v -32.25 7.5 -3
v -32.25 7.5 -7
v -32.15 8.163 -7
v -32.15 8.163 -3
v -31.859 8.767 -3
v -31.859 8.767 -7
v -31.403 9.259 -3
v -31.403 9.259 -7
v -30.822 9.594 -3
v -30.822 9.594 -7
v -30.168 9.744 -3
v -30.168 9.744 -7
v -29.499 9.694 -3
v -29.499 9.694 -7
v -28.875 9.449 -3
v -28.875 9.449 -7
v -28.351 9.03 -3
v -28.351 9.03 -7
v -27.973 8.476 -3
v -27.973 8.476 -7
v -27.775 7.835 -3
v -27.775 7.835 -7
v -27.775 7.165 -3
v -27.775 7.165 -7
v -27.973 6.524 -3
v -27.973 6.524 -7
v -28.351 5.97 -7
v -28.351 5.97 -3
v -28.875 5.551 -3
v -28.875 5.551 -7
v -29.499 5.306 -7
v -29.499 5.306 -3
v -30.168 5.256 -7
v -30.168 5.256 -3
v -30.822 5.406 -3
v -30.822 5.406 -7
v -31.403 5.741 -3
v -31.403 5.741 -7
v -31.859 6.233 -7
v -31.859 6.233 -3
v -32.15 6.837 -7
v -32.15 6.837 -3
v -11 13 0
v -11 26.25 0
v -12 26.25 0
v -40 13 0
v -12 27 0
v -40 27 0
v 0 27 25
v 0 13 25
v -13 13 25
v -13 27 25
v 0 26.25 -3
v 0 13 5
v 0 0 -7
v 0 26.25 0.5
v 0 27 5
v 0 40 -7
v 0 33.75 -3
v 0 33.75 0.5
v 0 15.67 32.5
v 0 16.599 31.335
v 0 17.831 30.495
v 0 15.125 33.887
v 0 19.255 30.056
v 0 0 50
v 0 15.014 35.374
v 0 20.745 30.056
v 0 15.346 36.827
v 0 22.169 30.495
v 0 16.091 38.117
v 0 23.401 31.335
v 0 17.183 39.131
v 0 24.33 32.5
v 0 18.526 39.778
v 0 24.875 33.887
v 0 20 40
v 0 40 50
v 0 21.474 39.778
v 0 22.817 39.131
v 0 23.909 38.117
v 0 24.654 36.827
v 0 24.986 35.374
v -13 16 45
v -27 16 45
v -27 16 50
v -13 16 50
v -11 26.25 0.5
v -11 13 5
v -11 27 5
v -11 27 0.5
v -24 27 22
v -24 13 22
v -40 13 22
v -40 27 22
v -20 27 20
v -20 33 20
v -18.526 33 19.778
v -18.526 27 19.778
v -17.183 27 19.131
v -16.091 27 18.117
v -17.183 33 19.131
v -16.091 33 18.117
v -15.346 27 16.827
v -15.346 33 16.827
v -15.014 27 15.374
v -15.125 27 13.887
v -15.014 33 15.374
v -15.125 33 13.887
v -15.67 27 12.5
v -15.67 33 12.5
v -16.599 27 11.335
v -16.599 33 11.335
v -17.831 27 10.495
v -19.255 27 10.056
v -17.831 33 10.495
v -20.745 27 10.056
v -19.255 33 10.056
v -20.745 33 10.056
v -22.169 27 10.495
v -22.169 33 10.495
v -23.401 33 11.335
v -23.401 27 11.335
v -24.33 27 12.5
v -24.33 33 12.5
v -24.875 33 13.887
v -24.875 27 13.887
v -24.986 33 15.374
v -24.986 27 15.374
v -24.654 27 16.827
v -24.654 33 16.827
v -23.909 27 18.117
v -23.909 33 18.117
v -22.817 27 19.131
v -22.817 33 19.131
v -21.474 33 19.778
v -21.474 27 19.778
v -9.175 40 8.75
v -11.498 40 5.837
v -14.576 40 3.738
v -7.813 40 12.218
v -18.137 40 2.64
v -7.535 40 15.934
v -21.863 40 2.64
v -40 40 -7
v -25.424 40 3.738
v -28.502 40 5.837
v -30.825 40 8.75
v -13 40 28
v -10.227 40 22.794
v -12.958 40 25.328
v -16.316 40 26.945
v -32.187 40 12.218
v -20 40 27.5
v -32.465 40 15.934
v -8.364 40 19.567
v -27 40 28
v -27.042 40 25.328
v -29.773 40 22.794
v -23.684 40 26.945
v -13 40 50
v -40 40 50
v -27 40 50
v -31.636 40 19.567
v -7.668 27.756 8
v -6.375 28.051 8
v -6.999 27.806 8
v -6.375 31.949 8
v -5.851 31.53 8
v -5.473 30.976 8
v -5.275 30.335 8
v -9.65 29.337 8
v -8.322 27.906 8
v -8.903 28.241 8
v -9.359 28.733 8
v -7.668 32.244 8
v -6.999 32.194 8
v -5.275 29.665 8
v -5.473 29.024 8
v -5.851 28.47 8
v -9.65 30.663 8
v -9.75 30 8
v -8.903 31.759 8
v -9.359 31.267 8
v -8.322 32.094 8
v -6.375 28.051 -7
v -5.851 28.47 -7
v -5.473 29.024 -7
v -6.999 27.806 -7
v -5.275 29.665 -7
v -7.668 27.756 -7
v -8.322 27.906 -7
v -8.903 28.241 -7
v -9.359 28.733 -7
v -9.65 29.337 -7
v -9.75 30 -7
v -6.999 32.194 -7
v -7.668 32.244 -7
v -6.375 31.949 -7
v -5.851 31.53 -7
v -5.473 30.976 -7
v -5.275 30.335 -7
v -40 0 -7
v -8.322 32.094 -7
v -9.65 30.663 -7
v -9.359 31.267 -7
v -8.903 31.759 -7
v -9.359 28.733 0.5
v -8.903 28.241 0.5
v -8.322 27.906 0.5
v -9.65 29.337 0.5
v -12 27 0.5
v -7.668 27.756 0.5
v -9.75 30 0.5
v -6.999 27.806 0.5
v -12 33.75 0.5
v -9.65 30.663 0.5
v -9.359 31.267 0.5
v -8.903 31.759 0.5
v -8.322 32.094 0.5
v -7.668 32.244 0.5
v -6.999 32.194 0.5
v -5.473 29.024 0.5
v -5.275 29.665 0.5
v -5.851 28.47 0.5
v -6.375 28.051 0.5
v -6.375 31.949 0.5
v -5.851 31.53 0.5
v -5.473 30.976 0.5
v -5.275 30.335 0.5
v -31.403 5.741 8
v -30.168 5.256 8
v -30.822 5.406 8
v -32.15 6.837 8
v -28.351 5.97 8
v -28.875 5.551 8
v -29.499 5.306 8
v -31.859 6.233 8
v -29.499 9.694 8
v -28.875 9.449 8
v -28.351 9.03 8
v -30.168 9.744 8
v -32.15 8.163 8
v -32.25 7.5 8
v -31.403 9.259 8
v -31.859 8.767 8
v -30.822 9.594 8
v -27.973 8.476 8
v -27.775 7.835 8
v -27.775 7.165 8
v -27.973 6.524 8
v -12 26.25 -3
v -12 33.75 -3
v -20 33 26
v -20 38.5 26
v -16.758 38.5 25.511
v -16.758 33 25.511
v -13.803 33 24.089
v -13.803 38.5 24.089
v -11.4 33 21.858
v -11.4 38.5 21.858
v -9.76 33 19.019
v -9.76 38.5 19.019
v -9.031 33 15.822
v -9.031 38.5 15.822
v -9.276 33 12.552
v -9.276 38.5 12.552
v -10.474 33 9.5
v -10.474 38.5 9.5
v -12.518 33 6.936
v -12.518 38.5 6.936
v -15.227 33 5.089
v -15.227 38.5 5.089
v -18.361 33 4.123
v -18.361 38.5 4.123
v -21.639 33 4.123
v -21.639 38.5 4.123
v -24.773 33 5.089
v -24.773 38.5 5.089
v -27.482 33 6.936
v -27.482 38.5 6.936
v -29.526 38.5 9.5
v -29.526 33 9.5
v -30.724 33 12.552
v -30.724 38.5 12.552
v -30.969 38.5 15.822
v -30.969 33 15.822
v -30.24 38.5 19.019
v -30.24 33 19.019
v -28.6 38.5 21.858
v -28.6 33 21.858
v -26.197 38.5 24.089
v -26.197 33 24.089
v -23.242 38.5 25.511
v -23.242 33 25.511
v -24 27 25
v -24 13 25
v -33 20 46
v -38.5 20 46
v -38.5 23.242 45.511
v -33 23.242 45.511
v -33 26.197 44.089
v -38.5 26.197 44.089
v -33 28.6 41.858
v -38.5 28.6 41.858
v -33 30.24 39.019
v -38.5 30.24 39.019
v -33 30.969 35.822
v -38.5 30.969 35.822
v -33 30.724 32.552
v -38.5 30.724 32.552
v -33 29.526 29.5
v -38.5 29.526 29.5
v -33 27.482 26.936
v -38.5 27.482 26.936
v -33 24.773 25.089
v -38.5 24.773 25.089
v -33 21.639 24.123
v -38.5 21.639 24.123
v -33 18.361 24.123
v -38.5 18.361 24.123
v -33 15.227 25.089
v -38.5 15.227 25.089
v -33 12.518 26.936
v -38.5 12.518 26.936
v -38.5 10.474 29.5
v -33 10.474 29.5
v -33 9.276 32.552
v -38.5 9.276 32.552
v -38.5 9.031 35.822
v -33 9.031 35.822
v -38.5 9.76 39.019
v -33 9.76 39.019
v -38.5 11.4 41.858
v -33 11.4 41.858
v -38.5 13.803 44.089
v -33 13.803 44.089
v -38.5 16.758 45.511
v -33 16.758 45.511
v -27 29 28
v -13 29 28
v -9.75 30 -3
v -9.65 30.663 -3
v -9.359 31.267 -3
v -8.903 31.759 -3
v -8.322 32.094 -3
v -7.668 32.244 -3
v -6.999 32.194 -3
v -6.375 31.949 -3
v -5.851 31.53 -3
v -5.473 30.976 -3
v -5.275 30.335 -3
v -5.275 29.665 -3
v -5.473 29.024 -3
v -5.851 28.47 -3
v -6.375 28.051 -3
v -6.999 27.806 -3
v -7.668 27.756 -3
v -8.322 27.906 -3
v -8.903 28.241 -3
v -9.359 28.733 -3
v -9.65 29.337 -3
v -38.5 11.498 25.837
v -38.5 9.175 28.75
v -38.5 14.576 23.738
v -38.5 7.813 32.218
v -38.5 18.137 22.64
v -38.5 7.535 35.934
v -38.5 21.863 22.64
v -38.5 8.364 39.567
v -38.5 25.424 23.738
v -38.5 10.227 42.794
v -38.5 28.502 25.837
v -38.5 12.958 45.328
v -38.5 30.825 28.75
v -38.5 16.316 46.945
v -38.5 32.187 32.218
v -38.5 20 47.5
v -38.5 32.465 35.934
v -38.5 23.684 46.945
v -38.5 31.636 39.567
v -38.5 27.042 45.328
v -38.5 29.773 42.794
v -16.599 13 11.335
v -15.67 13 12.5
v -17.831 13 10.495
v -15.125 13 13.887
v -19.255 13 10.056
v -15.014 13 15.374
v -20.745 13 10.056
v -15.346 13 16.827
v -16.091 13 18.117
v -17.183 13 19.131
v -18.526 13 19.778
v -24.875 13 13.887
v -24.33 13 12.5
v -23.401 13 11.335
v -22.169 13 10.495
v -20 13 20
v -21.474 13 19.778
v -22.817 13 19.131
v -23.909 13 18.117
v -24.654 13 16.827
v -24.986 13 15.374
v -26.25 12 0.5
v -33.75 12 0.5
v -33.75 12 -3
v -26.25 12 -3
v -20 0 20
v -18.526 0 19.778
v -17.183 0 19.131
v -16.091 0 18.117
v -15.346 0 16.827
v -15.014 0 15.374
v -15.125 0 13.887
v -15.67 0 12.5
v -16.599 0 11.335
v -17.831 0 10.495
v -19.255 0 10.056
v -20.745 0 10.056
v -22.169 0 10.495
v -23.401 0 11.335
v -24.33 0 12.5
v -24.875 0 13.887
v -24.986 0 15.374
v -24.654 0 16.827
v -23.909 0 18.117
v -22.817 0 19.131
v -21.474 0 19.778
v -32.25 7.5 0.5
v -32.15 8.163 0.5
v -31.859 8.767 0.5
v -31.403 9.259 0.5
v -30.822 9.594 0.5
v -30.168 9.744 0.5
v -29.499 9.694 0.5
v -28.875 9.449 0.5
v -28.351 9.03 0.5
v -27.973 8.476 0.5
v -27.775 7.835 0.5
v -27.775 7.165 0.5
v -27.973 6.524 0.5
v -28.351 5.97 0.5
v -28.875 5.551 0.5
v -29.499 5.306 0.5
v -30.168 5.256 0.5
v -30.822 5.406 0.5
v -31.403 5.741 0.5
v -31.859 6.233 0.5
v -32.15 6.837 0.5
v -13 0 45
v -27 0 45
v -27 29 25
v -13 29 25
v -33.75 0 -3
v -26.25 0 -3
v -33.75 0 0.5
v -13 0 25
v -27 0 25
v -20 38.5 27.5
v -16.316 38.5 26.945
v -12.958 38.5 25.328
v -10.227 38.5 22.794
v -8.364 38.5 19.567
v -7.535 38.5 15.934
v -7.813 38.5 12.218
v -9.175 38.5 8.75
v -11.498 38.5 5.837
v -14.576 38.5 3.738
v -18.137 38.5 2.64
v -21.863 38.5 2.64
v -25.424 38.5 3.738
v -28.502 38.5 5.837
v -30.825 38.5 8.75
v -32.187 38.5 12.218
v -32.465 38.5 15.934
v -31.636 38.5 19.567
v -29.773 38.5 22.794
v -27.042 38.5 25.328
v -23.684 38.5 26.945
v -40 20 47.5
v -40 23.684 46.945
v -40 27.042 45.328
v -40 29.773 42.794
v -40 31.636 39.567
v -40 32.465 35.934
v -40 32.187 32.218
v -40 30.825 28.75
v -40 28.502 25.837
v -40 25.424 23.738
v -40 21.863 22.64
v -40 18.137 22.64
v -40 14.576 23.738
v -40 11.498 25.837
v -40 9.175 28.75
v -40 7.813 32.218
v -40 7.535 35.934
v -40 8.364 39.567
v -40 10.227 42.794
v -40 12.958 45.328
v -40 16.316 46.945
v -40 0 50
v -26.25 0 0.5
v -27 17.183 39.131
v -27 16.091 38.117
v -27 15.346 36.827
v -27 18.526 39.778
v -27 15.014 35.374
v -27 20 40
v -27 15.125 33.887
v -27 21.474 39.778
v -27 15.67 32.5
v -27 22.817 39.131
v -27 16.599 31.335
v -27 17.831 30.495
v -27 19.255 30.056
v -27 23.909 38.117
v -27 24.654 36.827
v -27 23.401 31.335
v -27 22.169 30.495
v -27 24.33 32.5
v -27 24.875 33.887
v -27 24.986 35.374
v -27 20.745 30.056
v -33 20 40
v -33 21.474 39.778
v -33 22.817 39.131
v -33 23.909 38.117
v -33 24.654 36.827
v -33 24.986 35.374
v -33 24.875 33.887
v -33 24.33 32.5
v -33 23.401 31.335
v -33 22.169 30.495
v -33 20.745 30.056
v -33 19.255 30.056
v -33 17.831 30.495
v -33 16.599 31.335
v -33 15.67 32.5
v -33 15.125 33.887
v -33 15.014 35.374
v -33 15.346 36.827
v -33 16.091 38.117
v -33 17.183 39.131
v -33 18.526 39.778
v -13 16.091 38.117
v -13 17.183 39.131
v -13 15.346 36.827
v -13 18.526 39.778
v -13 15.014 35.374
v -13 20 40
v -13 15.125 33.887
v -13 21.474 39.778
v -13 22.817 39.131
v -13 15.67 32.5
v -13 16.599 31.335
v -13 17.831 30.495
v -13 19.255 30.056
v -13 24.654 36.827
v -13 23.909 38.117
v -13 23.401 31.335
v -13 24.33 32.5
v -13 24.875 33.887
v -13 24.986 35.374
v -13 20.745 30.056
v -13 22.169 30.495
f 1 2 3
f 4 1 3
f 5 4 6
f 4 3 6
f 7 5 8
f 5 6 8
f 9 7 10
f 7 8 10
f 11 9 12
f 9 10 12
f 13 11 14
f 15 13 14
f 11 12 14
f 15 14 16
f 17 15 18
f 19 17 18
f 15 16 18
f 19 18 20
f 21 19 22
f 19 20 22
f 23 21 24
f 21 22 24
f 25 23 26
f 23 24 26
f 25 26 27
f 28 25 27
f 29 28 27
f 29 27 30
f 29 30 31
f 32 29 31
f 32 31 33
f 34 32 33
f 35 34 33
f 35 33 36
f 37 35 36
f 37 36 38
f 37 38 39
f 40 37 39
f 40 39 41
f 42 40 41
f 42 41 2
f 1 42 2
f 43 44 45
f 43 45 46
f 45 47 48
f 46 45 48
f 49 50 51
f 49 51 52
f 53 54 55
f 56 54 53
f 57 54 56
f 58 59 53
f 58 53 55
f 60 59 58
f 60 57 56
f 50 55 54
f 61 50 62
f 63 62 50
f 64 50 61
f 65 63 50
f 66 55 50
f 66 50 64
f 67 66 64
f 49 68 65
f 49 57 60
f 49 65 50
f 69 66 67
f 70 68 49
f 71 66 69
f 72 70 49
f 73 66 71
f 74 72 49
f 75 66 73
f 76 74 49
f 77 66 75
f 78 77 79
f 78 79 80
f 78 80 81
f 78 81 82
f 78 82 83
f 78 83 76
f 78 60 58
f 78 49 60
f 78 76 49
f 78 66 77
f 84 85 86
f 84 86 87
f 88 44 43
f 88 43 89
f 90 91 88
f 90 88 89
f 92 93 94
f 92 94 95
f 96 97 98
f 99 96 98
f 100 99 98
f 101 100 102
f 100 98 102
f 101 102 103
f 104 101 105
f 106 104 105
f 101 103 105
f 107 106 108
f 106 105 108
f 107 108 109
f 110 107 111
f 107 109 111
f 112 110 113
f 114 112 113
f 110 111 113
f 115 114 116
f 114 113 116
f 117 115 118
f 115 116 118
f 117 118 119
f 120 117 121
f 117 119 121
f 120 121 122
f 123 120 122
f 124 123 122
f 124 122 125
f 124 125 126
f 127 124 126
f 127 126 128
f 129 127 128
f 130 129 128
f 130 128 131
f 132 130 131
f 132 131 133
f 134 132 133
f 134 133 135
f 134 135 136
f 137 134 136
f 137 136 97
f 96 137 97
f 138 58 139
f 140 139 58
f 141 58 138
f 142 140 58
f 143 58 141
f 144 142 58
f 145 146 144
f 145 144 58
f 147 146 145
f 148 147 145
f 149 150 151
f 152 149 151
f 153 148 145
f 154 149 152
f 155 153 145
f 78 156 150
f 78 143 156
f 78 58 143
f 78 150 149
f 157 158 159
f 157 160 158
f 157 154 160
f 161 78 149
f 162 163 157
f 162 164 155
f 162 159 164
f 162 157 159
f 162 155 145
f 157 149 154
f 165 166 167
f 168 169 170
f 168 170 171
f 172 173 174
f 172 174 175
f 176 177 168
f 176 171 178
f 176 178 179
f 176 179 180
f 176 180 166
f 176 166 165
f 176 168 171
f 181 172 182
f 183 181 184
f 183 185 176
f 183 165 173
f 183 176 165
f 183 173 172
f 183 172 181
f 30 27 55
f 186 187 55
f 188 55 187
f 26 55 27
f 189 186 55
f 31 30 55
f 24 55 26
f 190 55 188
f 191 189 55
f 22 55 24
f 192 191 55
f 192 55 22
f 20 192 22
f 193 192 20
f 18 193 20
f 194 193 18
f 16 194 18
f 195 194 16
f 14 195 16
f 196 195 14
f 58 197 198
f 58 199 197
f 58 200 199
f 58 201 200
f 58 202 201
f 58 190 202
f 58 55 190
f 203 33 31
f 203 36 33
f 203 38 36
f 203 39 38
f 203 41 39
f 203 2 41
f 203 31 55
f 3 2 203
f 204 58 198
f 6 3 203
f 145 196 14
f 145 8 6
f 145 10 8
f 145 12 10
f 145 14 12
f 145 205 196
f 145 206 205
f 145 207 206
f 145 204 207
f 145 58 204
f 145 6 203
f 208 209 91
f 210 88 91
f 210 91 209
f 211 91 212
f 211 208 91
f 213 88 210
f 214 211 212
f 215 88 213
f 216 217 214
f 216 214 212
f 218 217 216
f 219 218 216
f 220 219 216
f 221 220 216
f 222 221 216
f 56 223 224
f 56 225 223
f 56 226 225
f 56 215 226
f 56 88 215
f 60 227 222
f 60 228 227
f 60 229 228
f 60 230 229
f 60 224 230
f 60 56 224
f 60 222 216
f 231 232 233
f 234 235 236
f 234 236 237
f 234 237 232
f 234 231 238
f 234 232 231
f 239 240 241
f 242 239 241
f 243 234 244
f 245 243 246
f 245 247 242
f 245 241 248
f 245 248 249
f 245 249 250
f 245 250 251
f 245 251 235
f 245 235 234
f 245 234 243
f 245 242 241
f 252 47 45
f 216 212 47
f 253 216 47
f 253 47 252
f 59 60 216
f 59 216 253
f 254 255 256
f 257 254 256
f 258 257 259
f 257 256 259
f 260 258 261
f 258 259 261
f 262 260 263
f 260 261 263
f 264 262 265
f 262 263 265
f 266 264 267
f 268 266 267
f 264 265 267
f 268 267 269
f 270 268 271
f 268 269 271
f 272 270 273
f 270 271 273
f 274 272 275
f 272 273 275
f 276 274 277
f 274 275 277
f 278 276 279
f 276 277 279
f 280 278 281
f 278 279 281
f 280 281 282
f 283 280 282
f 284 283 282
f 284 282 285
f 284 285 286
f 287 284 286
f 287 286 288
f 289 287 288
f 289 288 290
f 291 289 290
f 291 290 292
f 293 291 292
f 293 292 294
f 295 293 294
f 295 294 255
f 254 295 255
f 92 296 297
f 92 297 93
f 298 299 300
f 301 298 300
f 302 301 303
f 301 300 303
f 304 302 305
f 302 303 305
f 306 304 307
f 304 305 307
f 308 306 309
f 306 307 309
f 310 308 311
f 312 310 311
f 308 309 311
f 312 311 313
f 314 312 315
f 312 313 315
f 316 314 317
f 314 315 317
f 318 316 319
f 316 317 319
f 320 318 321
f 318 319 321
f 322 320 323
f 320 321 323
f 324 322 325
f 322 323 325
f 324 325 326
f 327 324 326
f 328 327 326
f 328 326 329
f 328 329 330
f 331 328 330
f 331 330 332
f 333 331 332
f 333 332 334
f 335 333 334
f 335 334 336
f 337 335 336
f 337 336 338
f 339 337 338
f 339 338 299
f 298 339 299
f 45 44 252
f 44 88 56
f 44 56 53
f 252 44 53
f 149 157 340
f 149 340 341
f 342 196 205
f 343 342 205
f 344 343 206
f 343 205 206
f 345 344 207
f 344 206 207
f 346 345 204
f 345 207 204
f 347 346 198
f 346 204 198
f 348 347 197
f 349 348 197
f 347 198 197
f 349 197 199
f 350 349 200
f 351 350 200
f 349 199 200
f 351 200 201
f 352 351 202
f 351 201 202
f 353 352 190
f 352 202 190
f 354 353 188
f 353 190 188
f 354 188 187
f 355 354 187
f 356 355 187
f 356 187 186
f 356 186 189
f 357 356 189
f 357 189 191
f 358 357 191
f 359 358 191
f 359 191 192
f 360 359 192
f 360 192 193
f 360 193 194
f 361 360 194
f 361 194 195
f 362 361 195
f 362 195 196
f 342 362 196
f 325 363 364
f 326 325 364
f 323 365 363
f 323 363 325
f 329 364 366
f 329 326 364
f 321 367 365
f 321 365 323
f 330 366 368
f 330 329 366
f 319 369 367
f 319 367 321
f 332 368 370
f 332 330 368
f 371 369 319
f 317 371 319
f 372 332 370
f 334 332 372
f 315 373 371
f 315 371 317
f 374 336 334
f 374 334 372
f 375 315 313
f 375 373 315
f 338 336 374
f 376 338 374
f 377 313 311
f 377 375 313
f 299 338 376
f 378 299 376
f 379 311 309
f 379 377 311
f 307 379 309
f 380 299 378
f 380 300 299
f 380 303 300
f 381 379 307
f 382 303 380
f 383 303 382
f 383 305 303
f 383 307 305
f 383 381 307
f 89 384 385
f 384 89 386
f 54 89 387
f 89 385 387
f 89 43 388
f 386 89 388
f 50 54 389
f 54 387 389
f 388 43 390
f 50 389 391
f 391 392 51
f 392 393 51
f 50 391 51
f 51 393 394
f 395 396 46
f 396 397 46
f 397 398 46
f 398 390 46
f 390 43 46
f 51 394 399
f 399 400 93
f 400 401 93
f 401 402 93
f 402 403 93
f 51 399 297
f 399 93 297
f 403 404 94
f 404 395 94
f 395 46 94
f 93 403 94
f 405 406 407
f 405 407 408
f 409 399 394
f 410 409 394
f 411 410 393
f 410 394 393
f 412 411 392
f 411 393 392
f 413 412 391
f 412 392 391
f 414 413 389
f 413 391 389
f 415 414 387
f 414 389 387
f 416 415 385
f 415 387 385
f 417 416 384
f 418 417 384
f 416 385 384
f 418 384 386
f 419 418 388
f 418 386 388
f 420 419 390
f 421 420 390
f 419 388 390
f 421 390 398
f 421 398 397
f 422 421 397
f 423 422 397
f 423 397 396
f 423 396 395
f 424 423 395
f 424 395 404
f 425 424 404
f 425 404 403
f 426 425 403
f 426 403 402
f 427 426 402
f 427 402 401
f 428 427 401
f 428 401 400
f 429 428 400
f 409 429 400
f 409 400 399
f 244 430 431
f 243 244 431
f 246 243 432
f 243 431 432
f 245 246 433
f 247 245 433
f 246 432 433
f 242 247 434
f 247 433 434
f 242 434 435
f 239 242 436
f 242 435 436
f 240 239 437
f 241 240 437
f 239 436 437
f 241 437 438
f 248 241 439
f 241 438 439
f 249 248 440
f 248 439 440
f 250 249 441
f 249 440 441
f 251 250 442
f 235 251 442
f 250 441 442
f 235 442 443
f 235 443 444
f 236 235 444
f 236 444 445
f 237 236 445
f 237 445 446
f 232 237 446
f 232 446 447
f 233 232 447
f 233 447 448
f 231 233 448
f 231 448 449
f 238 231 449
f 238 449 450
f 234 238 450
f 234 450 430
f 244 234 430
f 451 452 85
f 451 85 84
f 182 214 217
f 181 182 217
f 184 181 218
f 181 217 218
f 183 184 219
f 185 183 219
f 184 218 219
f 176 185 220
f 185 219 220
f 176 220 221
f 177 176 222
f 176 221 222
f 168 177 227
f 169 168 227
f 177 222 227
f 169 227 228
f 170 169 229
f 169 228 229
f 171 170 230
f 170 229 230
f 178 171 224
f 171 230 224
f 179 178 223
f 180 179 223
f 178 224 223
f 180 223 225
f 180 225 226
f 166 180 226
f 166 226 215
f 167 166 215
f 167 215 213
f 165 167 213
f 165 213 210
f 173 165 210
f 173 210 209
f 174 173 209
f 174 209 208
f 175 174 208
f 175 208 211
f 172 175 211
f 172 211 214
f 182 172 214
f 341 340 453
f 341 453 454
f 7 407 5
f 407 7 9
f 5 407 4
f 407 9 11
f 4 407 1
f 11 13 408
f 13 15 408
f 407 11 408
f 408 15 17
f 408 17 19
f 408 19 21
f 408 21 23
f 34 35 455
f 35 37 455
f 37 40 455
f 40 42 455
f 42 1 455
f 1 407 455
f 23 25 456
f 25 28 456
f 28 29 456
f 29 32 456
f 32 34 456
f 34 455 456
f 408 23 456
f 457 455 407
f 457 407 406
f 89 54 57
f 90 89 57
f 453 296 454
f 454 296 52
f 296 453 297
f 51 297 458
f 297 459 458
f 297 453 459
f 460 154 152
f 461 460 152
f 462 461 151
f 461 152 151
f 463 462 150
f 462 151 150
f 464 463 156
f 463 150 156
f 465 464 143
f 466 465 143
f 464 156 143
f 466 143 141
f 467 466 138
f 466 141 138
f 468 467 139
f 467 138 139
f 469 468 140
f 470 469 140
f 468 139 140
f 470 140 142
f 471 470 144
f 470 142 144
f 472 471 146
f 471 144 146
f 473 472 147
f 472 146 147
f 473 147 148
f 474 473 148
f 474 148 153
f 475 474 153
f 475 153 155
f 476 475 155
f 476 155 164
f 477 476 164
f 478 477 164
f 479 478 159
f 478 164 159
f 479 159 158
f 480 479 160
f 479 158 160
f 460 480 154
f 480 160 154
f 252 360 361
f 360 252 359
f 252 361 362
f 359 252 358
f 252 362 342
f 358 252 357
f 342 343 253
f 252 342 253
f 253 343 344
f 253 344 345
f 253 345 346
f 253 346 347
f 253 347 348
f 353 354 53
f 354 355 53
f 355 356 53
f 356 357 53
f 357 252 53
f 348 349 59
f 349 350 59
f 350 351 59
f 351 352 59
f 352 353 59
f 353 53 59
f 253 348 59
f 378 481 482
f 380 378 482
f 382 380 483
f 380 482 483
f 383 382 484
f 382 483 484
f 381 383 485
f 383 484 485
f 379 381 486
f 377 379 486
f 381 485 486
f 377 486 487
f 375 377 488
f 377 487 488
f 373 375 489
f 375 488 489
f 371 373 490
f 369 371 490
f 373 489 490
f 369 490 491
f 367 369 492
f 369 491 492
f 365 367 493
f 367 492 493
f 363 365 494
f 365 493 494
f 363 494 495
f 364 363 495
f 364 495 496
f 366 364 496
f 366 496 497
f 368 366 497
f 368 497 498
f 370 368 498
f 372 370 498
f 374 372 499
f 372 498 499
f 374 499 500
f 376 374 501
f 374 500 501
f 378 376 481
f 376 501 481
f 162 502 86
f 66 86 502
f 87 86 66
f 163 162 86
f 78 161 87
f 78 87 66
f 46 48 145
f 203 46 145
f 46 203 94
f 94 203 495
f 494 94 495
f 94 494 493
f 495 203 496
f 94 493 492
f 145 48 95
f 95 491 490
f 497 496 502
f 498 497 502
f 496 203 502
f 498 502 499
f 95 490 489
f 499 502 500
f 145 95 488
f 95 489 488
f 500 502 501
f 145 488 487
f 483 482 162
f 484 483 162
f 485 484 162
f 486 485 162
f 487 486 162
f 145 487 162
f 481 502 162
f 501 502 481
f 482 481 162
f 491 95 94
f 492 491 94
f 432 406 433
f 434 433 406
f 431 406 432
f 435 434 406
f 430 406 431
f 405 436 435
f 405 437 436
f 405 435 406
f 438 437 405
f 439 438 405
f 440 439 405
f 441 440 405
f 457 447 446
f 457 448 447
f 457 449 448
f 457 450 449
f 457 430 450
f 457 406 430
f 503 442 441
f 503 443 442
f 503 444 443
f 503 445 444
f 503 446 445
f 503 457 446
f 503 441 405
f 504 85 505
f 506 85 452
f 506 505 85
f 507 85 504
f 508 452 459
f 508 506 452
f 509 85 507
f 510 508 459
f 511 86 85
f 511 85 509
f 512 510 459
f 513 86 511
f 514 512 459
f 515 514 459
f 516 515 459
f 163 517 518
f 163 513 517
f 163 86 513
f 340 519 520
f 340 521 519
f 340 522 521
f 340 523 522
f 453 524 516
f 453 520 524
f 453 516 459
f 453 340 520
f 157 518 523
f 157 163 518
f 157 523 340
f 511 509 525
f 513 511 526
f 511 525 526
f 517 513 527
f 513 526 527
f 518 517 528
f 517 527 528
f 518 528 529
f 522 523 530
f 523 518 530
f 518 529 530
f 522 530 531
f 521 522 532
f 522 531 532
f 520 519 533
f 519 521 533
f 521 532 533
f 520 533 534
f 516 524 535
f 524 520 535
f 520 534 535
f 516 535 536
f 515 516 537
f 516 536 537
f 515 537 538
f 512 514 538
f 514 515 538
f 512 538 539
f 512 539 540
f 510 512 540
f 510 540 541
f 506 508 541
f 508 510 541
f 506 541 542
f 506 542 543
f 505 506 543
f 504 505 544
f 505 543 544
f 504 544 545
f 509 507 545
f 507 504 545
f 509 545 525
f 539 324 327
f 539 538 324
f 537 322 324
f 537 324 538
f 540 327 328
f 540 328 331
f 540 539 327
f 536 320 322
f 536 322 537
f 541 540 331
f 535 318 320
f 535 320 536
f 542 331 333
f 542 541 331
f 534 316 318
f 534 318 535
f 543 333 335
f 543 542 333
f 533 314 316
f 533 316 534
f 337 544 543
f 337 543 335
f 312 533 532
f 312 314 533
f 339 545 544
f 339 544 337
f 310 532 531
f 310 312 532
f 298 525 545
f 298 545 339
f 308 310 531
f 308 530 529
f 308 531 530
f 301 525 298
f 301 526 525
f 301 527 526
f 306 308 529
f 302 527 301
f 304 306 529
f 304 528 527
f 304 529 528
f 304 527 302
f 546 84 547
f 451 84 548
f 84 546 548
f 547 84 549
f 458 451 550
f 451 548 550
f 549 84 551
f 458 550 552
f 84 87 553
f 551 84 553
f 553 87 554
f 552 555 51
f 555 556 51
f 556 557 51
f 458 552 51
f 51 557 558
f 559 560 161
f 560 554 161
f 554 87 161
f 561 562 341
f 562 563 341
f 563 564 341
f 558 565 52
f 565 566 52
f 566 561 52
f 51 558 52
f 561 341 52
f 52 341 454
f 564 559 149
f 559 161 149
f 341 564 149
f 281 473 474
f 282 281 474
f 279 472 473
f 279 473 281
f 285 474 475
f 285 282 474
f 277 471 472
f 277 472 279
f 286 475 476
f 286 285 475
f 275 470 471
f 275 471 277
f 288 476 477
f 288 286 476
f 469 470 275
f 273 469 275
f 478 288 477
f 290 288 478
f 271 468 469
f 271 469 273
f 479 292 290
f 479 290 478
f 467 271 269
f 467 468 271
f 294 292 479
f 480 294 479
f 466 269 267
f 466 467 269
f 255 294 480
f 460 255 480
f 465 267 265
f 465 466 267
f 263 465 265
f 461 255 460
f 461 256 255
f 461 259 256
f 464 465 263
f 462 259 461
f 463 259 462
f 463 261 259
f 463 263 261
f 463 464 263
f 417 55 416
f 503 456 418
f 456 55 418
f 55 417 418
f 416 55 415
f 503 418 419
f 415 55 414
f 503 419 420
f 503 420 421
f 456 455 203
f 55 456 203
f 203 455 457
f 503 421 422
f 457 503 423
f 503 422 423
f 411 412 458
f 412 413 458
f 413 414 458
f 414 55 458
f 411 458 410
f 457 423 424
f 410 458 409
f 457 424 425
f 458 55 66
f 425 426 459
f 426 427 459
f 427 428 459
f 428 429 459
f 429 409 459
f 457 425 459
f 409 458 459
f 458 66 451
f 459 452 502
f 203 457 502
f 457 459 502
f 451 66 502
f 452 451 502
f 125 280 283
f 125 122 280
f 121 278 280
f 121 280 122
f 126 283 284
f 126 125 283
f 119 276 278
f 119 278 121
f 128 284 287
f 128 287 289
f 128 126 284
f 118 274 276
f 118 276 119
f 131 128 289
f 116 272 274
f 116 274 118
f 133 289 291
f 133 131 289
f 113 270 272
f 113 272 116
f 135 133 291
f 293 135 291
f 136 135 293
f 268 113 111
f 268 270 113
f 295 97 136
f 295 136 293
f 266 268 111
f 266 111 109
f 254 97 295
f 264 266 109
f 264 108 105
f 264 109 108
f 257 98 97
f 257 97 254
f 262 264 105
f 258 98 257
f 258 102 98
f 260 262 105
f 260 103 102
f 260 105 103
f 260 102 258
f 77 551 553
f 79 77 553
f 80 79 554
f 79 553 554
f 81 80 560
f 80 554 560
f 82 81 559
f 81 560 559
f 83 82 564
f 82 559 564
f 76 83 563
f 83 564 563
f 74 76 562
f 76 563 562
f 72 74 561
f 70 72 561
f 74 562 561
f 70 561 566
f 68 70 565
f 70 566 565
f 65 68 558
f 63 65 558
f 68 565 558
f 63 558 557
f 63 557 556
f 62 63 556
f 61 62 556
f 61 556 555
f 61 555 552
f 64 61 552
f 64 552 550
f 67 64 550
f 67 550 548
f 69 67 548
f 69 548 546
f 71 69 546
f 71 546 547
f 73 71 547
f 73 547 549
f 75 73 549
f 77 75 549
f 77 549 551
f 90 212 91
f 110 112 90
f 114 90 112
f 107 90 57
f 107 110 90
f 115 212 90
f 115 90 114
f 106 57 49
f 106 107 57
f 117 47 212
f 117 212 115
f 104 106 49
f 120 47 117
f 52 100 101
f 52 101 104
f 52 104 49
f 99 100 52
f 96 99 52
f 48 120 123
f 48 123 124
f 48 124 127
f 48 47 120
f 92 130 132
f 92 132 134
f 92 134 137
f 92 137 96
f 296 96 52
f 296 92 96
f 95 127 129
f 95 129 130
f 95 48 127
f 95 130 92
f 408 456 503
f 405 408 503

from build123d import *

# Parameters (mm, degrees)
ESQUISSE1_W              = 40
ESQUISSE1_H              = 40
BOSS_EXTRU_1_DEPTH       = 50
ESQUISSE2_R              = 5
ENL_V_MAT_EXTRU_1_DEPTH  = 41
ESQUISSE3_R              = 5
ENL_V_MAT_EXTRU_2_DEPTH  = 41
ESQUISSE4_W              = 22
ESQUISSE4_H              = 14
ENL_V_MAT_EXTRU_3_DEPTH  = 29
ESQUISSE5_W              = 14
ESQUISSE5_H              = 20
ENL_V_MAT_EXTRU_4_DEPTH  = 29
ESQUISSE6_W              = 20
ESQUISSE6_H              = 14
ENL_V_MAT_EXTRU_5_DEPTH  = 24
ESQUISSE7_W              = 14
ESQUISSE7_H              = 22
ENL_V_MAT_EXTRU_6_DEPTH  = 24
ESQUISSE10_R             = 11
ENL_V_MAT_EXTRU_9_DEPTH  = 7
ESQUISSE11_R             = 12.5
ENL_V_MAT_EXTRU_10_DEPTH = 1.5
ESQUISSE14_R             = 11
ENL_V_MAT_EXTRU_11_DEPTH = 7
ESQUISSE15_R             = 12.5
ENL_V_MAT_EXTRU_12_DEPTH = 1.5
ESQUISSE16_W             = 40
ESQUISSE16_H             = 40
BOSS_EXTRU_2_DEPTH       = 7
ESQUISSE17_R             = 2.25
ENL_V_MAT_EXTRU_13_DEPTH = 15
ESQUISSE18_W             = 3.5
ESQUISSE18_H             = 7.5
ENL_V_MAT_EXTRU_14_DEPTH = 12
ESQUISSE19_W             = 7.5
ESQUISSE19_H             = 3.5
ENL_V_MAT_EXTRU_15_DEPTH = 12


with BuildPart() as part:
    # Esquisse1 → Boss.-Extru.1 (new body)
    with BuildSketch(Plane.XY):
        with Locations((-20, 20)):
            Rectangle(ESQUISSE1_W, ESQUISSE1_H)
    extrude(amount=BOSS_EXTRU_1_DEPTH)

    # Esquisse2 → Enlèv. mat.-Extru.1 (cut, through all)
    with BuildSketch(Plane(origin=(0, 40, 0), x_dir=(1, 0, 0), z_dir=(0, 1, 0))):
        with Locations(Location((-20, -15, 0), (0, 0, 270))):  # turned: the seam where the file's is
            Circle(ESQUISSE2_R)
    extrude(amount=-ENL_V_MAT_EXTRU_1_DEPTH, mode=Mode.SUBTRACT)

    # Esquisse3 → Enlèv. mat.-Extru.2 (cut, through all)
    with BuildSketch(Plane.ZY.offset(40)):
        with Locations((35, 20)):
            Circle(ESQUISSE3_R)
    extrude(amount=-ENL_V_MAT_EXTRU_2_DEPTH, mode=Mode.SUBTRACT)

    # Esquisse4 → Enlèv. mat.-Extru.3 (cut)
    with BuildSketch(Plane.ZY.offset(40)):
        with Locations((11, 20)):
            Rectangle(ESQUISSE4_W, ESQUISSE4_H)
    extrude(amount=-ENL_V_MAT_EXTRU_3_DEPTH, mode=Mode.SUBTRACT)

    # Esquisse5 → Enlèv. mat.-Extru.4 (cut)
    with BuildSketch(Plane.XZ):
        with Locations((-20, 35)):
            Rectangle(ESQUISSE5_W, ESQUISSE5_H)
    extrude(amount=-ENL_V_MAT_EXTRU_4_DEPTH, mode=Mode.SUBTRACT)

    # Esquisse6 → Enlèv. mat.-Extru.5 (cut)
    with BuildSketch(Plane(origin=(0, 0, 0), x_dir=(0, 0, -1), z_dir=(1, 0, 0))):
        with Locations((-15, 20)):
            Rectangle(ESQUISSE6_W, ESQUISSE6_H)
    extrude(amount=-ENL_V_MAT_EXTRU_5_DEPTH, mode=Mode.SUBTRACT)

    # Esquisse7 → Enlèv. mat.-Extru.6 (cut)
    with BuildSketch(Plane(origin=(0, 40, 0), x_dir=(1, 0, 0), z_dir=(0, 1, 0))):
        with Locations((-20, -39)):
            Rectangle(ESQUISSE7_W, ESQUISSE7_H)
    extrude(amount=-ENL_V_MAT_EXTRU_6_DEPTH, mode=Mode.SUBTRACT)

    # Esquisse10 → Enlèv. mat.-Extru.9 (cut)
    with BuildSketch(Plane(origin=(0, 40, 0), x_dir=(1, 0, 0), z_dir=(0, 1, 0))):
        with Locations(Location((-20, -15, 0), (0, 0, 270))):  # turned: the seam where the file's is
            Circle(ESQUISSE10_R)
    extrude(amount=-ENL_V_MAT_EXTRU_9_DEPTH, mode=Mode.SUBTRACT)

    # Esquisse11 → Enlèv. mat.-Extru.10 (cut)
    with BuildSketch(Plane(origin=(0, 40, 0), x_dir=(1, 0, 0), z_dir=(0, 1, 0))):
        with Locations(Location((-20, -15, 0), (0, 0, 270))):  # turned: the seam where the file's is
            Circle(ESQUISSE11_R)
    extrude(amount=-ENL_V_MAT_EXTRU_10_DEPTH, mode=Mode.SUBTRACT)

    # Esquisse14 → Enlèv. mat.-Extru.11 (cut)
    with BuildSketch(Plane.ZY.offset(40)):
        with Locations((35, 20)):
            Circle(ESQUISSE14_R)
    extrude(amount=-ENL_V_MAT_EXTRU_11_DEPTH, mode=Mode.SUBTRACT)

    # Esquisse15 → Enlèv. mat.-Extru.12 (cut)
    with BuildSketch(Plane.ZY.offset(40)):
        with Locations((35, 20)):
            Circle(ESQUISSE15_R)
    extrude(amount=-ENL_V_MAT_EXTRU_12_DEPTH, mode=Mode.SUBTRACT)

    # Esquisse16 → Boss.-Extru.2 (add)
    with BuildSketch(Plane(origin=(0, 0, 0), x_dir=(-1, 0, 0), z_dir=(0, 0, -1))):
        with Locations((20, 20)):
            Rectangle(ESQUISSE16_W, ESQUISSE16_H)
    extrude(amount=BOSS_EXTRU_2_DEPTH)

    # Esquisse17 → Enlèv. mat.-Extru.13 (cut)
    with BuildSketch(Plane(origin=(0, 0, -7), x_dir=(-1, 0, 0), z_dir=(0, 0, -1))):
        with Locations((7.5, 30)):
            Circle(ESQUISSE17_R)
        with Locations((30, 7.5)):
            Circle(ESQUISSE17_R)
    extrude(amount=-ENL_V_MAT_EXTRU_13_DEPTH, mode=Mode.SUBTRACT)

    # Esquisse18 → Enlèv. mat.-Extru.14 (cut)
    with BuildSketch(Plane(origin=(0, 0, 0), x_dir=(0, 0, -1), z_dir=(1, 0, 0))):
        with Locations((1.25, 30)):
            Rectangle(ESQUISSE18_W, ESQUISSE18_H)
    extrude(amount=-ENL_V_MAT_EXTRU_14_DEPTH, mode=Mode.SUBTRACT)

    # Esquisse19 → Enlèv. mat.-Extru.15 (cut)
    with BuildSketch(Plane.XZ):
        with Locations((-30, -1.25)):
            Rectangle(ESQUISSE19_W, ESQUISSE19_H)
    extrude(amount=-ENL_V_MAT_EXTRU_15_DEPTH, mode=Mode.SUBTRACT)


solid = part.part
